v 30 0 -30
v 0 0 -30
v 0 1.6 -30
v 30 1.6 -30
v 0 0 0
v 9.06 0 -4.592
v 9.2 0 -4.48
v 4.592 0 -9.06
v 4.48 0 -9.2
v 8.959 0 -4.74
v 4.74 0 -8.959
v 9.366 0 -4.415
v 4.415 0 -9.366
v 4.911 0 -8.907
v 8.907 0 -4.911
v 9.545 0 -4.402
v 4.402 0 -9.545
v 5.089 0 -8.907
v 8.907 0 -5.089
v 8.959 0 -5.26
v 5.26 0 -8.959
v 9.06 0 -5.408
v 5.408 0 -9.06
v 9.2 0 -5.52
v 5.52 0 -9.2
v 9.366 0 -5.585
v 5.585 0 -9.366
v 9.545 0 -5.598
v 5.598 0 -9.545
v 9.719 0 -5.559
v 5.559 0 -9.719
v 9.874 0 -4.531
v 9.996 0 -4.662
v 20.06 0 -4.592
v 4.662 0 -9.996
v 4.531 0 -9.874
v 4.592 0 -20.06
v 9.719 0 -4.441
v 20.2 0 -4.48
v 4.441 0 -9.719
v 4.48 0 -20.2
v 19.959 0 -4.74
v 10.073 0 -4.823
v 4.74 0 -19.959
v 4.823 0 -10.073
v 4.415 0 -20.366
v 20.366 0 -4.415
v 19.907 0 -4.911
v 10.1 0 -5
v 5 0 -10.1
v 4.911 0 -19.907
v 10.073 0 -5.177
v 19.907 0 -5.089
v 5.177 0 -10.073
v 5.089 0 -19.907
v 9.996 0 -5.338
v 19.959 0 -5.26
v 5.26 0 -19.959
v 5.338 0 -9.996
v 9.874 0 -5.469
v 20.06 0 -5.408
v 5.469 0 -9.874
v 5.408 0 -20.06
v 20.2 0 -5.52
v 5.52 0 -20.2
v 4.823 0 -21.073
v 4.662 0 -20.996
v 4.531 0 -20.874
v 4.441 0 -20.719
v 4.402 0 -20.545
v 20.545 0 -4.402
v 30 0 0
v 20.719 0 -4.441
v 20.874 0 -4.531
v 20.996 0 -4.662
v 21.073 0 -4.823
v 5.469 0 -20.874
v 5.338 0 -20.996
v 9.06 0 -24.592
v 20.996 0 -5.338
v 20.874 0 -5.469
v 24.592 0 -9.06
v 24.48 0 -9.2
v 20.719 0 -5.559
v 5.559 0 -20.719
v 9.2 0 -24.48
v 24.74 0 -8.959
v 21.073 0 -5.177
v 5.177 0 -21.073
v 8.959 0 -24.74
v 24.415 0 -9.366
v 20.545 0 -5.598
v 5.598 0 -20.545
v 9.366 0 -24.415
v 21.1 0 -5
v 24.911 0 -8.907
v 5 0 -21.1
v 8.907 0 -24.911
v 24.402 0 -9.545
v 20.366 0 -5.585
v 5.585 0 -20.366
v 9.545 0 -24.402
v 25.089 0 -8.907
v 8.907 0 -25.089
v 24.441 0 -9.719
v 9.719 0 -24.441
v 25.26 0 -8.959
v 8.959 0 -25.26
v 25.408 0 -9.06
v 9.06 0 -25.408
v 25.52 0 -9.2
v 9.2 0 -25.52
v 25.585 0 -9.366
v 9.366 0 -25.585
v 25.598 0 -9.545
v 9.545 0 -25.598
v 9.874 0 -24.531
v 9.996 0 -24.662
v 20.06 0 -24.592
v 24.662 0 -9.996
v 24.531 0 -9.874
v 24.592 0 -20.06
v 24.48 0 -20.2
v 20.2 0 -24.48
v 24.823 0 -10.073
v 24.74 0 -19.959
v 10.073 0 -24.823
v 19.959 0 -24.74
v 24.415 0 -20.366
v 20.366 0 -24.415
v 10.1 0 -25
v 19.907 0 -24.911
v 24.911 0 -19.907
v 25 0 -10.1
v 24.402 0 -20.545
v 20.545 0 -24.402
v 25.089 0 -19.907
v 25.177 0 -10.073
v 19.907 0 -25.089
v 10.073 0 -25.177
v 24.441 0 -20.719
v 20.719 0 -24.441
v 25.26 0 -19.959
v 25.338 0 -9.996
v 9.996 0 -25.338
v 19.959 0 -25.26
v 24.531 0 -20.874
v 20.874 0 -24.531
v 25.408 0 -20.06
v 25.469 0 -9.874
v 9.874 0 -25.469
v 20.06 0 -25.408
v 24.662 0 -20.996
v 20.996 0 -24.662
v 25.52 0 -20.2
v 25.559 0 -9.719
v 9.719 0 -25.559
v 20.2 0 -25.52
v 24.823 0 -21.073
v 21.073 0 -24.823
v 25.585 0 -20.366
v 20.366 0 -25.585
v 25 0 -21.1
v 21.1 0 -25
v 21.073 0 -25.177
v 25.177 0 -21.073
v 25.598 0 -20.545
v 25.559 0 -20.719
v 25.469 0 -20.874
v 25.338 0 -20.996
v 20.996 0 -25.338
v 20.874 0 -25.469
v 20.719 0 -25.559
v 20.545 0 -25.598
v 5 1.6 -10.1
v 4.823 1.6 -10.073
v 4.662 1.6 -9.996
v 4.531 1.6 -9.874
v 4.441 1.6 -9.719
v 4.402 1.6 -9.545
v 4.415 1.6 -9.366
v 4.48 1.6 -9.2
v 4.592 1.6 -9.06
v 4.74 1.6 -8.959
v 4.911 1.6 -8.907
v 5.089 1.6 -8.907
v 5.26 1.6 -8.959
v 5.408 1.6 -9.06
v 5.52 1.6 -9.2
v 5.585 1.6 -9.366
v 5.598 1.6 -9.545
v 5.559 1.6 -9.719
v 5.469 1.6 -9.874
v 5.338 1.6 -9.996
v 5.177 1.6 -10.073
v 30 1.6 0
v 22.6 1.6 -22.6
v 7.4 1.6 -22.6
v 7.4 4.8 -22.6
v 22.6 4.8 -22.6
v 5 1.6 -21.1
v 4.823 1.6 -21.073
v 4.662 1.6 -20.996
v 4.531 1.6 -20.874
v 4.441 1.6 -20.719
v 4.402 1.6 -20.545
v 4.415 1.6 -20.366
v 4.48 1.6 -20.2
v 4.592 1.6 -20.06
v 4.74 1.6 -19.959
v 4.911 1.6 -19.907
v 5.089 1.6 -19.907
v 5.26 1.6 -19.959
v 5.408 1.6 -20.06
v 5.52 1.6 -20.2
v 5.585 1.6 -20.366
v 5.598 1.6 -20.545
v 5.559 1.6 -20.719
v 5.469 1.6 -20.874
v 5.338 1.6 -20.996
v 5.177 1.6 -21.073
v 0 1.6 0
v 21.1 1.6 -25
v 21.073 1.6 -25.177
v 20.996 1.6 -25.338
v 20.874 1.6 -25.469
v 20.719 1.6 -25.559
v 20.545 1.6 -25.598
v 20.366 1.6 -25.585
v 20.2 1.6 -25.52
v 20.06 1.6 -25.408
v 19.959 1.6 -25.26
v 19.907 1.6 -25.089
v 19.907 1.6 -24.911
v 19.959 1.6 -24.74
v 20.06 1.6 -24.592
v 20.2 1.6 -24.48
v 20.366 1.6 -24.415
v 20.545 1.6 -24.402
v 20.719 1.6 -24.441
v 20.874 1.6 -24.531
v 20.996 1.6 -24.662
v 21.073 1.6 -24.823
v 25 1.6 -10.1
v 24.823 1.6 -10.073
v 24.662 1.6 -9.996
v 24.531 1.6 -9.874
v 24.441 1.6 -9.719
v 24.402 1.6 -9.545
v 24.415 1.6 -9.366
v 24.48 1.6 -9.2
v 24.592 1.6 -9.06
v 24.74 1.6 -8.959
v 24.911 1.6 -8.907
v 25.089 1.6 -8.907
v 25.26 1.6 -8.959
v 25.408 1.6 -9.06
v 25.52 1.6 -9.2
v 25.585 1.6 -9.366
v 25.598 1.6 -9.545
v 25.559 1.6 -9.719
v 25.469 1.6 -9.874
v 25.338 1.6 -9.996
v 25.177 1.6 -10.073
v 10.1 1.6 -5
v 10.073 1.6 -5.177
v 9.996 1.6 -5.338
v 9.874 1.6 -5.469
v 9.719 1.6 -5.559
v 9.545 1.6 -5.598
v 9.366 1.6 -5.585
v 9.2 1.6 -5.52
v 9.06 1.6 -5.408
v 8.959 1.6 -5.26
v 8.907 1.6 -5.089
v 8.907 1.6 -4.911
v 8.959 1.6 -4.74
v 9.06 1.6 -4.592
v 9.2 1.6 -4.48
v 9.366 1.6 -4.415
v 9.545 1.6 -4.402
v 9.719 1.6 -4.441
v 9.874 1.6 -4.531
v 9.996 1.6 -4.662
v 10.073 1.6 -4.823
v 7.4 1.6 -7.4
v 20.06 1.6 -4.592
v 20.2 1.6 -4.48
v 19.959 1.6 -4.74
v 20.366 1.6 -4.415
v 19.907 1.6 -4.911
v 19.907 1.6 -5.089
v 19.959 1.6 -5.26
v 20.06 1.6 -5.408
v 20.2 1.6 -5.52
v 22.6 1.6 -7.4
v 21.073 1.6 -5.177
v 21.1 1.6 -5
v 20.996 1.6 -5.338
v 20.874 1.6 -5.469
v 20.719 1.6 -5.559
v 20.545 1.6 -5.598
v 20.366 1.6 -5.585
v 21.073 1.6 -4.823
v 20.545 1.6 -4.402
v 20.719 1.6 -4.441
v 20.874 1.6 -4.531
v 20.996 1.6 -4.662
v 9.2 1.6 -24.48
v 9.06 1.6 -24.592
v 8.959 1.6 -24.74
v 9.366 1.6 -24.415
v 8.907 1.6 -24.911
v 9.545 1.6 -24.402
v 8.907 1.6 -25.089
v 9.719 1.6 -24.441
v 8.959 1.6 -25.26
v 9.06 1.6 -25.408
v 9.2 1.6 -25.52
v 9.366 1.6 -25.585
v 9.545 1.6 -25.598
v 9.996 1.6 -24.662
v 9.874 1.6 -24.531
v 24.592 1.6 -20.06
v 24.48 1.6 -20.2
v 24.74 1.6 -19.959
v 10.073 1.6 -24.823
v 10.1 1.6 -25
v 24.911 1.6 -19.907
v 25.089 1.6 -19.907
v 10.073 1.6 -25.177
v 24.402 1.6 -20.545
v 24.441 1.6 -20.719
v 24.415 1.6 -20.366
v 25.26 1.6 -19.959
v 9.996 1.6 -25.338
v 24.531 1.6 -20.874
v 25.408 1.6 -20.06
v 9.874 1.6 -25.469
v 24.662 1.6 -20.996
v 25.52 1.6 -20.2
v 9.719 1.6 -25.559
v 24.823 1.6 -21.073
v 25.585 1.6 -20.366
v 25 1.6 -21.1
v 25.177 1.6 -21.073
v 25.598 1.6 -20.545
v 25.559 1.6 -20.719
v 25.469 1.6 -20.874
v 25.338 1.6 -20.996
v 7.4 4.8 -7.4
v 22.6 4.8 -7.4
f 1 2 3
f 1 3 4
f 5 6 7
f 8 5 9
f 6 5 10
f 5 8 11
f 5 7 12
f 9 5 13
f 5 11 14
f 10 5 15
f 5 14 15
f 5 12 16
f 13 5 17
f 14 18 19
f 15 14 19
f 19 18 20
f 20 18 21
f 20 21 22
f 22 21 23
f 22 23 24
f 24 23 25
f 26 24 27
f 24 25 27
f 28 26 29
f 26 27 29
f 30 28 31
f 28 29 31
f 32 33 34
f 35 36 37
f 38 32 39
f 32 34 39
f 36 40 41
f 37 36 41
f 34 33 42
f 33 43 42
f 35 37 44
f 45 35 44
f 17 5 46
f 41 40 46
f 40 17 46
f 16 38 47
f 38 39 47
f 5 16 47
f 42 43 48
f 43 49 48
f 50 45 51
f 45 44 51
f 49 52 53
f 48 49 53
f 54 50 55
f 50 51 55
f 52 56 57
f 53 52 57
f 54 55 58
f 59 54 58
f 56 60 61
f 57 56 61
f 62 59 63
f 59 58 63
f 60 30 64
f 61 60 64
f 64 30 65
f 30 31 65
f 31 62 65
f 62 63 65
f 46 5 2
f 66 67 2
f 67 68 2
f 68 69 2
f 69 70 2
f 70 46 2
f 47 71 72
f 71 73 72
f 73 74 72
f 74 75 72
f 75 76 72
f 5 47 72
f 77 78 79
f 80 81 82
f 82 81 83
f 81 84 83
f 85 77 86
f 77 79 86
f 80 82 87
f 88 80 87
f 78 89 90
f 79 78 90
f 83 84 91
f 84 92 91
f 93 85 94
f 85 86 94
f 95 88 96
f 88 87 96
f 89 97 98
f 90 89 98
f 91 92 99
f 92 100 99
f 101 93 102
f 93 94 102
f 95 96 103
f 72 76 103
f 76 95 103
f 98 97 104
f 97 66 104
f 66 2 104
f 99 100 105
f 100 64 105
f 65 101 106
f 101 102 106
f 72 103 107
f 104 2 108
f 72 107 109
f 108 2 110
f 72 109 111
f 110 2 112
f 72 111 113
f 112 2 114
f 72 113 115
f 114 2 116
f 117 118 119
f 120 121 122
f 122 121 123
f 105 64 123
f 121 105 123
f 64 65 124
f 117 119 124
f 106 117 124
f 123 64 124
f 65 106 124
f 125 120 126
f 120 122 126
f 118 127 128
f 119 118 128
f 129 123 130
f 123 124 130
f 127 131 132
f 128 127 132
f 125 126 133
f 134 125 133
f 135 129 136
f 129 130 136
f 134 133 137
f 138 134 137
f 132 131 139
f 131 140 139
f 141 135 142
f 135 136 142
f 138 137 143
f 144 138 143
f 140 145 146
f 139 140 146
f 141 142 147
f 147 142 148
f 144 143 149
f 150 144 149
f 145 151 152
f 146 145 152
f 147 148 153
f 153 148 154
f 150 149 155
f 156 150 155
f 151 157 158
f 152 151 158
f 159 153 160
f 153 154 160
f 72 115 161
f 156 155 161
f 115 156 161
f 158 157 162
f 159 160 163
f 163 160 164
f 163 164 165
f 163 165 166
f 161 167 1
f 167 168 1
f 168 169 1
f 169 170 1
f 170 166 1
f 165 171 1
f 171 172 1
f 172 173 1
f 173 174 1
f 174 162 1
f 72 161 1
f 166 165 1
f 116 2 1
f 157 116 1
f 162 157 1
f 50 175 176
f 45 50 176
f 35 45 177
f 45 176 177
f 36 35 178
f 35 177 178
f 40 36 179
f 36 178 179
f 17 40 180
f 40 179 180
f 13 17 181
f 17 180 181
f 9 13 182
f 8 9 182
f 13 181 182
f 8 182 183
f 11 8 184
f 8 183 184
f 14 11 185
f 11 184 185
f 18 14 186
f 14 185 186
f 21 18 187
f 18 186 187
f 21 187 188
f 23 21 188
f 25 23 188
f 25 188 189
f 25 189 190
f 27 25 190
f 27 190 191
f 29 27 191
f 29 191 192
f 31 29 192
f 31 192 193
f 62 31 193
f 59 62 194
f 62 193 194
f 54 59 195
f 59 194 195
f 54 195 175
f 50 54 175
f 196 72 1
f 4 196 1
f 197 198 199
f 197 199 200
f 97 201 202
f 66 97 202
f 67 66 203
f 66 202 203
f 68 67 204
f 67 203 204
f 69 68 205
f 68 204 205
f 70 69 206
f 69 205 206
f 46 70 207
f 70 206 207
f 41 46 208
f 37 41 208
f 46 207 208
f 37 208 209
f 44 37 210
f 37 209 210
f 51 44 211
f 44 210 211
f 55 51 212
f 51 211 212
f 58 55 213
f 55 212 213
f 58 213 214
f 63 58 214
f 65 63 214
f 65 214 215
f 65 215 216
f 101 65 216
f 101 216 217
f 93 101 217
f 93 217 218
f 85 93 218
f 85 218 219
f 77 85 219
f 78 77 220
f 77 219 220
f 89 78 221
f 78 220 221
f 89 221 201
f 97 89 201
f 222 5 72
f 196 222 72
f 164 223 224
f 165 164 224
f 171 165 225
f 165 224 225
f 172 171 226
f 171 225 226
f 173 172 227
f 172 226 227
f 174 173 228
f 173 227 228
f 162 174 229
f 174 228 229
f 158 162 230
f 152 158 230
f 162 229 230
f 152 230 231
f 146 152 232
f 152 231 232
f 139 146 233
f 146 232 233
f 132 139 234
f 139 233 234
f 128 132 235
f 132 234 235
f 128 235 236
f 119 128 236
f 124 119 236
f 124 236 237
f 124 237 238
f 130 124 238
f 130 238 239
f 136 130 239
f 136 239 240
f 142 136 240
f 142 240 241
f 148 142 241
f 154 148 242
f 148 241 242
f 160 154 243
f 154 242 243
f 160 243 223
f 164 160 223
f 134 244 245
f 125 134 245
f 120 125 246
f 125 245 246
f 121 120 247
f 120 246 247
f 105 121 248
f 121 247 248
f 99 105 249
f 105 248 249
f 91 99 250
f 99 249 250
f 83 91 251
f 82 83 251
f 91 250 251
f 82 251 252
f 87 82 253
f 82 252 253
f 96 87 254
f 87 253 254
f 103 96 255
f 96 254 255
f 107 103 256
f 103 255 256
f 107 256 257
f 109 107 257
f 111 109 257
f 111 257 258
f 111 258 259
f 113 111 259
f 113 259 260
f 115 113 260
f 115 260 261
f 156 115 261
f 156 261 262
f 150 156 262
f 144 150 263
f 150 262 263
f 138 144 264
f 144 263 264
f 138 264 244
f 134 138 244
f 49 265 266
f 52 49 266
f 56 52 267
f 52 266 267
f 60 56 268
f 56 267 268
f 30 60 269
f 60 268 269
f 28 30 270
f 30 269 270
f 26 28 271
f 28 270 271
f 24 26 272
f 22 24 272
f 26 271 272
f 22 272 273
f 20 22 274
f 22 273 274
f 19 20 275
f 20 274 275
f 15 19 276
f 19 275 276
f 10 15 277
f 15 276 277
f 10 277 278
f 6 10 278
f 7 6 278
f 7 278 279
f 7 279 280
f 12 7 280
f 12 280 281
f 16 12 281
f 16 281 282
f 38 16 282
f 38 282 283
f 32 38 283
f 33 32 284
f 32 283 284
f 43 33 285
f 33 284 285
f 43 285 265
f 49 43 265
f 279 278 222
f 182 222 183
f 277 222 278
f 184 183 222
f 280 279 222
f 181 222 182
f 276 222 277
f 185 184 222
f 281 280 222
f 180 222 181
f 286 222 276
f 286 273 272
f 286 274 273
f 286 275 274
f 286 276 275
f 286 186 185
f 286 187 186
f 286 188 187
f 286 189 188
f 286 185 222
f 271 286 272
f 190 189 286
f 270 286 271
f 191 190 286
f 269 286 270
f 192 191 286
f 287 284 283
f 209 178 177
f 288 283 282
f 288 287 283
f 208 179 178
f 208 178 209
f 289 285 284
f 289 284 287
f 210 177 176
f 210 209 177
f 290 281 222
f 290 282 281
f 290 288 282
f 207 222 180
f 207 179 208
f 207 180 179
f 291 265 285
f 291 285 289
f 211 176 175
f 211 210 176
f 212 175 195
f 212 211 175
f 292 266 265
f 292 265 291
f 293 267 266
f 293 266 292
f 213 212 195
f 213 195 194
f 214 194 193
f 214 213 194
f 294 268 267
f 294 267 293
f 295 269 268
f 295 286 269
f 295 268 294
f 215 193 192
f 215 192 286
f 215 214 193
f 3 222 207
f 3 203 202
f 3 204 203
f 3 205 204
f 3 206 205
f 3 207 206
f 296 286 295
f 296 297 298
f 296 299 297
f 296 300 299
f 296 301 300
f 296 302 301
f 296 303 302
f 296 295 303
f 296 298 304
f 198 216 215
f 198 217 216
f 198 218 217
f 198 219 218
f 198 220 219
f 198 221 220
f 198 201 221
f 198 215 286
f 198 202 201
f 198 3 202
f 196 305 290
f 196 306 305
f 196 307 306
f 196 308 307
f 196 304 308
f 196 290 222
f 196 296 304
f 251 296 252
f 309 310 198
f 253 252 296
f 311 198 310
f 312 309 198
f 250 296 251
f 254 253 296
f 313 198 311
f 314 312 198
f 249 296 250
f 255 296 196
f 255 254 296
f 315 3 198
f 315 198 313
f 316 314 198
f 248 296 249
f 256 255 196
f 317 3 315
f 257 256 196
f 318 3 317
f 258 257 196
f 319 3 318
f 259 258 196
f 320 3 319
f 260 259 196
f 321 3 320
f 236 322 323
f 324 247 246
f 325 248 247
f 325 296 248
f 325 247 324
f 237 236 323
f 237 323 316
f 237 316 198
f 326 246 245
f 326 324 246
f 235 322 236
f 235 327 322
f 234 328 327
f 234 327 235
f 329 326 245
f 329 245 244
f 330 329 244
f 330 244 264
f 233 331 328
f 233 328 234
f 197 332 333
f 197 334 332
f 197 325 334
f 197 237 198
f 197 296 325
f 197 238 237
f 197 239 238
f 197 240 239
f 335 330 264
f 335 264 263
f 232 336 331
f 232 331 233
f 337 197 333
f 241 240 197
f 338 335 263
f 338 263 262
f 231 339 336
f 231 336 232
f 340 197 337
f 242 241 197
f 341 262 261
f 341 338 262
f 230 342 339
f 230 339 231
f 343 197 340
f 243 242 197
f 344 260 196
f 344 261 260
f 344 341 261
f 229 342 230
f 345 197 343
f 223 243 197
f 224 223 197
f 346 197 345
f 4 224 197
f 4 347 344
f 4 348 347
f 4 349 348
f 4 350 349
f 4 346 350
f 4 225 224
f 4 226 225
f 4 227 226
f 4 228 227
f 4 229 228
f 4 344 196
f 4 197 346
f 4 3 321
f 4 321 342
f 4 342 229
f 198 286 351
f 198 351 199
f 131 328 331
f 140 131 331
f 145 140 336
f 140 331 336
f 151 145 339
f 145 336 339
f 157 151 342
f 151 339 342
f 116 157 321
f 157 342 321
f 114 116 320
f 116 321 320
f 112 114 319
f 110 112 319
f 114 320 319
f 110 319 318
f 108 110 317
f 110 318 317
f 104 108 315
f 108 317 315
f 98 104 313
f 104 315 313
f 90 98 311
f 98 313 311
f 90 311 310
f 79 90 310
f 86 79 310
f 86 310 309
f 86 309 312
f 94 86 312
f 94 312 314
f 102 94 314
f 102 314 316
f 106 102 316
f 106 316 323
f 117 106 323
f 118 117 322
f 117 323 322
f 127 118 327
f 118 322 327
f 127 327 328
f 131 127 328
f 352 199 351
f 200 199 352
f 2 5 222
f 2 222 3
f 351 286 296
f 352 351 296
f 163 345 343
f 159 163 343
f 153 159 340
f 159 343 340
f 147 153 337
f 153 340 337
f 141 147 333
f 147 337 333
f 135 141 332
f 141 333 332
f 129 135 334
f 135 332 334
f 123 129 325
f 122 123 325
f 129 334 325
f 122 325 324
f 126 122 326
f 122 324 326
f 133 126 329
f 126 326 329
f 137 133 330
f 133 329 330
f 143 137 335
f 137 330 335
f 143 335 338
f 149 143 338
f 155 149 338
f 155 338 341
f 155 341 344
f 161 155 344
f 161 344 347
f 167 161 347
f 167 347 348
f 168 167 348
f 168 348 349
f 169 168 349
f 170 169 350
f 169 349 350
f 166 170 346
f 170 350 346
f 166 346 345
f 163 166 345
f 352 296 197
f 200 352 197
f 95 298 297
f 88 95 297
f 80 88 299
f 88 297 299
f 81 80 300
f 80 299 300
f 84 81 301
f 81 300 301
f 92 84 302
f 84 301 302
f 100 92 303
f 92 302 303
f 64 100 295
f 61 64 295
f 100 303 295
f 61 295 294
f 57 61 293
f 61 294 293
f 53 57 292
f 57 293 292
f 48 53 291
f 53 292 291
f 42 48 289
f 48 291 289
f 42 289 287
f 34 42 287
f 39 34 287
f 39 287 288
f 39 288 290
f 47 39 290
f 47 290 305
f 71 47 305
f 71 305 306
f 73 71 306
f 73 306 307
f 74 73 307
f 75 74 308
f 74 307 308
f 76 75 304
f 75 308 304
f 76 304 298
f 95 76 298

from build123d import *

# Parameters (mm, degrees)
SKETCH1_W           = 30
SKETCH1_H           = 30
BOSS_EXTRUDE1_DEPTH = 1.6
SKETCH2_R           = 0.6
CUT_EXTRUDE1_DEPTH  = 1.6
CIRPATTERN1_COUNT   = 2
CIRPATTERN1_ANGLE   = 90
SKETCH4_W           = 15.2
SKETCH4_H           = 15.2
BOSS_EXTRUDE2_DEPTH = 3.2


with BuildPart() as part:
    # Sketch1 → Boss-Extrude1 (new body)
    with BuildSketch(Plane(origin=(0, 0, 0), x_dir=(1, 0, 0), z_dir=(0, 1, 0))):
        with Locations((15, 15)):
            Rectangle(SKETCH1_W, SKETCH1_H)
    extrude(amount=BOSS_EXTRUDE1_DEPTH)

    # Sketch2 → Cut-Extrude1 (cut)
    with BuildSketch(Plane(origin=(0, 1.6, 0), x_dir=(1, 0, 0), z_dir=(0, 1, 0))):
        with Locations((20.5, 5)):
            Circle(SKETCH2_R)
        with Locations((9.5, 5)):
            Circle(SKETCH2_R)
        with Locations((20.5, 25)):
            Circle(SKETCH2_R)
        with Locations((9.5, 25)):
            Circle(SKETCH2_R)
    cut_extrude1 = extrude(amount=-CUT_EXTRUDE1_DEPTH, mode=Mode.SUBTRACT)

    # CirPattern1: Cut-Extrude1 ×2 about axis
    cirpattern1_axis = Axis((15, 0, -15), (0, 1, 0))
    for i in range(1, CIRPATTERN1_COUNT):
        add(cut_extrude1.rotate(cirpattern1_axis, i * CIRPATTERN1_ANGLE / (CIRPATTERN1_COUNT - 1)), mode=Mode.SUBTRACT)

    # Sketch4 → Boss-Extrude2 (add)
    with BuildSketch(Plane(origin=(0, 1.6, 0), x_dir=(1, 0, 0), z_dir=(0, 1, 0))):
        with Locations((15, 15)):
            Rectangle(SKETCH4_W, SKETCH4_H)
    extrude(amount=BOSS_EXTRUDE2_DEPTH)


solid = part.part
